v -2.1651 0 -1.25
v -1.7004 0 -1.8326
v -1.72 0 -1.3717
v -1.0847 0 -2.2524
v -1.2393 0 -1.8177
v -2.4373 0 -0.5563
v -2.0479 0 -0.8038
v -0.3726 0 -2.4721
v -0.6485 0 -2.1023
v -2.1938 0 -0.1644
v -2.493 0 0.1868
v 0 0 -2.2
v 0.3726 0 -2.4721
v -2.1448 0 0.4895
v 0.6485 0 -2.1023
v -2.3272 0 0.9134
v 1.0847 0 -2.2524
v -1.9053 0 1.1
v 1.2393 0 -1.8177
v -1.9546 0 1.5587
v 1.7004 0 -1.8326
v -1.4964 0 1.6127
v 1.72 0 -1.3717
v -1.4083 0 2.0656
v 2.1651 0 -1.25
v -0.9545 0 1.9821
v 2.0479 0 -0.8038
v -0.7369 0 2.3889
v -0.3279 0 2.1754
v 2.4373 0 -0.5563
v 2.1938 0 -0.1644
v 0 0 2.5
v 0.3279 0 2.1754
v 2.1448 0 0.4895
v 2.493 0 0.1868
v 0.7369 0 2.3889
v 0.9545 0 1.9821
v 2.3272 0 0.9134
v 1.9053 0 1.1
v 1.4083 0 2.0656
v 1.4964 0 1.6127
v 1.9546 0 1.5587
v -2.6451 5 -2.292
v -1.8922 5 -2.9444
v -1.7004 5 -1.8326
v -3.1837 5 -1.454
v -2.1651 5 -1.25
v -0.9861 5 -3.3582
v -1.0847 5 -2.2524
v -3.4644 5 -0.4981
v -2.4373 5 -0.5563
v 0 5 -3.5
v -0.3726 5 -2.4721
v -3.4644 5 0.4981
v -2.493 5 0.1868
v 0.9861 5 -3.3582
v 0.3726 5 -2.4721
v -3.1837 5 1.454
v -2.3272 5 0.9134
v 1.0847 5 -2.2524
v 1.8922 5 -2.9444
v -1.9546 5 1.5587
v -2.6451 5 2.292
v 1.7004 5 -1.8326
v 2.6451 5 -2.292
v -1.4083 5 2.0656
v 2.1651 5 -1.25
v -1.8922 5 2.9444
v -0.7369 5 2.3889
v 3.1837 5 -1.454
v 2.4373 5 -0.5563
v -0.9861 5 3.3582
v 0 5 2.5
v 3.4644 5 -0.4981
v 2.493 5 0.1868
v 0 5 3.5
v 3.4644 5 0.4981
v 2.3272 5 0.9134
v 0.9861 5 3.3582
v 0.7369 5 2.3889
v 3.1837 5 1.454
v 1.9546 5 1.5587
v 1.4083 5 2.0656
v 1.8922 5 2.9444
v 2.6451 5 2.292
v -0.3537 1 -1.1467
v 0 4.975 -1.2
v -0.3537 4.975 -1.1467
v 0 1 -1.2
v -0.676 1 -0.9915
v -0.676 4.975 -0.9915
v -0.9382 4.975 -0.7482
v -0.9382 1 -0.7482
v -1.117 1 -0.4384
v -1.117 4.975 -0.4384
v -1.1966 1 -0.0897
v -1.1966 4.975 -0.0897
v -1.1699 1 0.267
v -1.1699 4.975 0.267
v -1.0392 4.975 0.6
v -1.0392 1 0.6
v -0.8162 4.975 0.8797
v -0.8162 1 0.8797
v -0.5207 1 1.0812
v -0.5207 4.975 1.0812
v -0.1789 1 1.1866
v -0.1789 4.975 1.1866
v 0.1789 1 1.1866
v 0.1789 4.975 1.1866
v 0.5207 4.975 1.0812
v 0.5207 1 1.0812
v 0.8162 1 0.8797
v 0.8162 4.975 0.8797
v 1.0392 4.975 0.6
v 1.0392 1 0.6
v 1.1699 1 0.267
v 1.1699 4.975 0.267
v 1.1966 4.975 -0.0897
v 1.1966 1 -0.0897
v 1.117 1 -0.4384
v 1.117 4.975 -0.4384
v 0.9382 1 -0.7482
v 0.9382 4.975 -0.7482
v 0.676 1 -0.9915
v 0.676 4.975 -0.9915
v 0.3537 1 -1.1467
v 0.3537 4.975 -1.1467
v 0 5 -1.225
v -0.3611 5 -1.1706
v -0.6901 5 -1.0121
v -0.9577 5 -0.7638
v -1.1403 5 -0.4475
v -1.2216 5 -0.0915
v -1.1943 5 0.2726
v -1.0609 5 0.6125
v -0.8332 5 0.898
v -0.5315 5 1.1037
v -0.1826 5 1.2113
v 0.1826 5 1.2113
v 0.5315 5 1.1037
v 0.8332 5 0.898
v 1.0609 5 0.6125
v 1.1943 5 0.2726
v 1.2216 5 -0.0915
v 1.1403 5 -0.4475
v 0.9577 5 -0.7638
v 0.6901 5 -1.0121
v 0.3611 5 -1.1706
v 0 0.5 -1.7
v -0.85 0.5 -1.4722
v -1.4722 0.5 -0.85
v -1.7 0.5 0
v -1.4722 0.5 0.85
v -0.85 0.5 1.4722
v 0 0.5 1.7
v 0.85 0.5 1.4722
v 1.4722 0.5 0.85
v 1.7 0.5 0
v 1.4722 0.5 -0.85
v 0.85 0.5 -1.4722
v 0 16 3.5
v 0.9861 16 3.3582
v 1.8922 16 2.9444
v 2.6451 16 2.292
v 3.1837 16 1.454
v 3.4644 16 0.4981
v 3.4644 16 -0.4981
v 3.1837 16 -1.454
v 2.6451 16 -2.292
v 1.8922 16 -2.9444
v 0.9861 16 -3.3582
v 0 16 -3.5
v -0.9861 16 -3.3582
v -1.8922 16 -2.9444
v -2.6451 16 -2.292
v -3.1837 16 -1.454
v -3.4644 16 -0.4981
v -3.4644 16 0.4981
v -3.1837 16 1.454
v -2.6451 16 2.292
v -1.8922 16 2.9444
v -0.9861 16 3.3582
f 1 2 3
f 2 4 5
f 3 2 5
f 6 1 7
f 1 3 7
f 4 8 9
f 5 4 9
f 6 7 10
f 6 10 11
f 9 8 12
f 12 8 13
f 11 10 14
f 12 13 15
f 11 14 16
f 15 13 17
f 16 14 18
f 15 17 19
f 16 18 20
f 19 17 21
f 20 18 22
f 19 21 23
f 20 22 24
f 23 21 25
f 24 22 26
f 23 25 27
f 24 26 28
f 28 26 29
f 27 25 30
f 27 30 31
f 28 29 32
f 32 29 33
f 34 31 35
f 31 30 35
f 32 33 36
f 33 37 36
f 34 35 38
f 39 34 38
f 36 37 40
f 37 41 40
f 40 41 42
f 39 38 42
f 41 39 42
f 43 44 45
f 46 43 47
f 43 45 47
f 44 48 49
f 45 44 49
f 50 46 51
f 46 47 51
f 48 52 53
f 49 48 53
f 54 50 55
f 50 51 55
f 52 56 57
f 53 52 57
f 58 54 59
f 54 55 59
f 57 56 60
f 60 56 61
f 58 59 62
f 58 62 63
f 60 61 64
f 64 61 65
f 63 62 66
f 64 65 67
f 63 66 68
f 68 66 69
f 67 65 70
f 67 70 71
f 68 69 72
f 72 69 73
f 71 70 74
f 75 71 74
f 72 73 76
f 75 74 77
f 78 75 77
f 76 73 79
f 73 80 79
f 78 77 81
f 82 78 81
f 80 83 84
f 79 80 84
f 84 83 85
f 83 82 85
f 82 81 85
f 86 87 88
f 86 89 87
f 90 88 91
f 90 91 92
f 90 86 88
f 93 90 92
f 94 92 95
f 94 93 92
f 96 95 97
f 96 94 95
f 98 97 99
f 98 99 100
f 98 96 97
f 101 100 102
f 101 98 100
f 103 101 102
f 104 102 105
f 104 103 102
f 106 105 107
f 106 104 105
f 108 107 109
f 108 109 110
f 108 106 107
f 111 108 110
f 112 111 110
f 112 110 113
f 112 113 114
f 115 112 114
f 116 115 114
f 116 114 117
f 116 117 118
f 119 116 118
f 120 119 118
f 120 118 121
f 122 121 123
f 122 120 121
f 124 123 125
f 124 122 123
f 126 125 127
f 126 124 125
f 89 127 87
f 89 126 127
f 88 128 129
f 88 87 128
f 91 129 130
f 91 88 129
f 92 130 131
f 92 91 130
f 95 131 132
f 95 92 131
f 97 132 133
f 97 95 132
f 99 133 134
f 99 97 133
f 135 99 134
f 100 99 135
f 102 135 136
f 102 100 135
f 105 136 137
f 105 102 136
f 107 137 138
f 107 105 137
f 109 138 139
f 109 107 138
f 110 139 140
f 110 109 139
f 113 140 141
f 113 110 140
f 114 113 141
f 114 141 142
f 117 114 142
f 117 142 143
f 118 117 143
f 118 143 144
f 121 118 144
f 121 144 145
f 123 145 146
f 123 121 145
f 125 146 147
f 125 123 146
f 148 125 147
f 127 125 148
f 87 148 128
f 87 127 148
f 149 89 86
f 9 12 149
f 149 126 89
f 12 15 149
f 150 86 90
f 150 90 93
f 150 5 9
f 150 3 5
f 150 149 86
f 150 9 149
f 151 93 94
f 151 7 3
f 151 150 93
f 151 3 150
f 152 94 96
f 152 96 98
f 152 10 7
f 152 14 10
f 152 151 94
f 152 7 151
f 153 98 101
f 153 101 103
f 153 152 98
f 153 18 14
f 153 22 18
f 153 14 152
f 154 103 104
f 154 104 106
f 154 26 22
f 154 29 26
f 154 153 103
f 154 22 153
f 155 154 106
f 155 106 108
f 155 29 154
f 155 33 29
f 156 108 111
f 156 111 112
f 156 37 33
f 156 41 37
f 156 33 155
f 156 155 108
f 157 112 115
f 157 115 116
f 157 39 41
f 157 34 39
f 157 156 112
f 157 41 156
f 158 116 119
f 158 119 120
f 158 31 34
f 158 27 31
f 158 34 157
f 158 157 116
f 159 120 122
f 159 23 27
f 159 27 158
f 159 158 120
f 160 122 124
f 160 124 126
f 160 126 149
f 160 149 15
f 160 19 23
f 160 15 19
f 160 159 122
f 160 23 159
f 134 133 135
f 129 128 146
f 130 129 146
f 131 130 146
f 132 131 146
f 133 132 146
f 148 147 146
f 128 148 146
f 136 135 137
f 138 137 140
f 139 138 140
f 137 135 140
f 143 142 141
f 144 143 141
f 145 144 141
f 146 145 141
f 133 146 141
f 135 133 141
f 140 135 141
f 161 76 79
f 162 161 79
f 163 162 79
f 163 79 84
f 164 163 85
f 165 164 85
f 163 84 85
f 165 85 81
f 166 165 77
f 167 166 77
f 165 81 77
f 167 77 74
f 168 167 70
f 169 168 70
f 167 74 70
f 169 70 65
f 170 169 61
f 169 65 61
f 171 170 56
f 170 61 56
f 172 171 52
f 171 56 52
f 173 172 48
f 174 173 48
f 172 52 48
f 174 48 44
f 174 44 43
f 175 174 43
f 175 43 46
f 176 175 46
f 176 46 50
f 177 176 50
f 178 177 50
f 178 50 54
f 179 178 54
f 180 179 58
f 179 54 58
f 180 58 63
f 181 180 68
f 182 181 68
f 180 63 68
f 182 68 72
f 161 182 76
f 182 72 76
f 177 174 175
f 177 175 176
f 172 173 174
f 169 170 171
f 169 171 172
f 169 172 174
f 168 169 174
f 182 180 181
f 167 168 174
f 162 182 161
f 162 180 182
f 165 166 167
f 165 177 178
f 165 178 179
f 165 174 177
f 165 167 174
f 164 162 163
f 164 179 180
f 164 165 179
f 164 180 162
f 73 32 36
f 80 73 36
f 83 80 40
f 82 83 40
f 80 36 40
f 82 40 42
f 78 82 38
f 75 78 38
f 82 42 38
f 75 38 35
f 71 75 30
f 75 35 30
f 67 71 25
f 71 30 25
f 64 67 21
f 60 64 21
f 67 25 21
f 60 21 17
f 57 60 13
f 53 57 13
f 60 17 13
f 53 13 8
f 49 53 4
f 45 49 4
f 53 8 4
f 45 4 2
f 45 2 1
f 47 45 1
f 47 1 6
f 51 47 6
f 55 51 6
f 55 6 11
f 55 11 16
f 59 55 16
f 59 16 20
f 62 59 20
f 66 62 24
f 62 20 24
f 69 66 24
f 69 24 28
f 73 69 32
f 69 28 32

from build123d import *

# Parameters (mm, degrees)
SKETCH1_R           = 2.5
BOSS_EXTRUDE1_DEPTH = 5
SKETCH2_R           = 3.5
BOSS_EXTRUDE2_DEPTH = 11


with BuildPart() as part:
    # Sketch1 → Boss-Extrude1 (new body)
    with BuildSketch(Plane(origin=(0, 0, 0), x_dir=(1, 0, 0), z_dir=(0, 1, 0))):
        with Locations(Location((0, 0, 0), (0, 0, 270))):
            Circle(SKETCH1_R)
    extrude(amount=BOSS_EXTRUDE1_DEPTH)

    # Sketch7 → CSK for M2 Oval Head Machine Screw2 (revolve, cut)
    with BuildSketch(Plane(origin=(0, 0, 0), x_dir=(0, 0, -1), z_dir=(1, 0, 0))):
        Polygon((0, 0), (0, 5), (1.225, 5), (1.2, 4.975), (1.2, 1), (2.2, 0), align=None)
    revolve(axis=Axis((0, -6.35, 0), (0, 1, 0)), mode=Mode.SUBTRACT)

    # Sketch2 → Boss-Extrude2 (add)
    with BuildSketch(Plane(origin=(0, 5, 0), x_dir=(1, 0, 0), z_dir=(0, 1, 0))):
        with Locations(Location((0, 0, 0), (0, 0, 270))):
            Circle(SKETCH2_R)
    extrude(amount=BOSS_EXTRUDE2_DEPTH)


solid = part.part
